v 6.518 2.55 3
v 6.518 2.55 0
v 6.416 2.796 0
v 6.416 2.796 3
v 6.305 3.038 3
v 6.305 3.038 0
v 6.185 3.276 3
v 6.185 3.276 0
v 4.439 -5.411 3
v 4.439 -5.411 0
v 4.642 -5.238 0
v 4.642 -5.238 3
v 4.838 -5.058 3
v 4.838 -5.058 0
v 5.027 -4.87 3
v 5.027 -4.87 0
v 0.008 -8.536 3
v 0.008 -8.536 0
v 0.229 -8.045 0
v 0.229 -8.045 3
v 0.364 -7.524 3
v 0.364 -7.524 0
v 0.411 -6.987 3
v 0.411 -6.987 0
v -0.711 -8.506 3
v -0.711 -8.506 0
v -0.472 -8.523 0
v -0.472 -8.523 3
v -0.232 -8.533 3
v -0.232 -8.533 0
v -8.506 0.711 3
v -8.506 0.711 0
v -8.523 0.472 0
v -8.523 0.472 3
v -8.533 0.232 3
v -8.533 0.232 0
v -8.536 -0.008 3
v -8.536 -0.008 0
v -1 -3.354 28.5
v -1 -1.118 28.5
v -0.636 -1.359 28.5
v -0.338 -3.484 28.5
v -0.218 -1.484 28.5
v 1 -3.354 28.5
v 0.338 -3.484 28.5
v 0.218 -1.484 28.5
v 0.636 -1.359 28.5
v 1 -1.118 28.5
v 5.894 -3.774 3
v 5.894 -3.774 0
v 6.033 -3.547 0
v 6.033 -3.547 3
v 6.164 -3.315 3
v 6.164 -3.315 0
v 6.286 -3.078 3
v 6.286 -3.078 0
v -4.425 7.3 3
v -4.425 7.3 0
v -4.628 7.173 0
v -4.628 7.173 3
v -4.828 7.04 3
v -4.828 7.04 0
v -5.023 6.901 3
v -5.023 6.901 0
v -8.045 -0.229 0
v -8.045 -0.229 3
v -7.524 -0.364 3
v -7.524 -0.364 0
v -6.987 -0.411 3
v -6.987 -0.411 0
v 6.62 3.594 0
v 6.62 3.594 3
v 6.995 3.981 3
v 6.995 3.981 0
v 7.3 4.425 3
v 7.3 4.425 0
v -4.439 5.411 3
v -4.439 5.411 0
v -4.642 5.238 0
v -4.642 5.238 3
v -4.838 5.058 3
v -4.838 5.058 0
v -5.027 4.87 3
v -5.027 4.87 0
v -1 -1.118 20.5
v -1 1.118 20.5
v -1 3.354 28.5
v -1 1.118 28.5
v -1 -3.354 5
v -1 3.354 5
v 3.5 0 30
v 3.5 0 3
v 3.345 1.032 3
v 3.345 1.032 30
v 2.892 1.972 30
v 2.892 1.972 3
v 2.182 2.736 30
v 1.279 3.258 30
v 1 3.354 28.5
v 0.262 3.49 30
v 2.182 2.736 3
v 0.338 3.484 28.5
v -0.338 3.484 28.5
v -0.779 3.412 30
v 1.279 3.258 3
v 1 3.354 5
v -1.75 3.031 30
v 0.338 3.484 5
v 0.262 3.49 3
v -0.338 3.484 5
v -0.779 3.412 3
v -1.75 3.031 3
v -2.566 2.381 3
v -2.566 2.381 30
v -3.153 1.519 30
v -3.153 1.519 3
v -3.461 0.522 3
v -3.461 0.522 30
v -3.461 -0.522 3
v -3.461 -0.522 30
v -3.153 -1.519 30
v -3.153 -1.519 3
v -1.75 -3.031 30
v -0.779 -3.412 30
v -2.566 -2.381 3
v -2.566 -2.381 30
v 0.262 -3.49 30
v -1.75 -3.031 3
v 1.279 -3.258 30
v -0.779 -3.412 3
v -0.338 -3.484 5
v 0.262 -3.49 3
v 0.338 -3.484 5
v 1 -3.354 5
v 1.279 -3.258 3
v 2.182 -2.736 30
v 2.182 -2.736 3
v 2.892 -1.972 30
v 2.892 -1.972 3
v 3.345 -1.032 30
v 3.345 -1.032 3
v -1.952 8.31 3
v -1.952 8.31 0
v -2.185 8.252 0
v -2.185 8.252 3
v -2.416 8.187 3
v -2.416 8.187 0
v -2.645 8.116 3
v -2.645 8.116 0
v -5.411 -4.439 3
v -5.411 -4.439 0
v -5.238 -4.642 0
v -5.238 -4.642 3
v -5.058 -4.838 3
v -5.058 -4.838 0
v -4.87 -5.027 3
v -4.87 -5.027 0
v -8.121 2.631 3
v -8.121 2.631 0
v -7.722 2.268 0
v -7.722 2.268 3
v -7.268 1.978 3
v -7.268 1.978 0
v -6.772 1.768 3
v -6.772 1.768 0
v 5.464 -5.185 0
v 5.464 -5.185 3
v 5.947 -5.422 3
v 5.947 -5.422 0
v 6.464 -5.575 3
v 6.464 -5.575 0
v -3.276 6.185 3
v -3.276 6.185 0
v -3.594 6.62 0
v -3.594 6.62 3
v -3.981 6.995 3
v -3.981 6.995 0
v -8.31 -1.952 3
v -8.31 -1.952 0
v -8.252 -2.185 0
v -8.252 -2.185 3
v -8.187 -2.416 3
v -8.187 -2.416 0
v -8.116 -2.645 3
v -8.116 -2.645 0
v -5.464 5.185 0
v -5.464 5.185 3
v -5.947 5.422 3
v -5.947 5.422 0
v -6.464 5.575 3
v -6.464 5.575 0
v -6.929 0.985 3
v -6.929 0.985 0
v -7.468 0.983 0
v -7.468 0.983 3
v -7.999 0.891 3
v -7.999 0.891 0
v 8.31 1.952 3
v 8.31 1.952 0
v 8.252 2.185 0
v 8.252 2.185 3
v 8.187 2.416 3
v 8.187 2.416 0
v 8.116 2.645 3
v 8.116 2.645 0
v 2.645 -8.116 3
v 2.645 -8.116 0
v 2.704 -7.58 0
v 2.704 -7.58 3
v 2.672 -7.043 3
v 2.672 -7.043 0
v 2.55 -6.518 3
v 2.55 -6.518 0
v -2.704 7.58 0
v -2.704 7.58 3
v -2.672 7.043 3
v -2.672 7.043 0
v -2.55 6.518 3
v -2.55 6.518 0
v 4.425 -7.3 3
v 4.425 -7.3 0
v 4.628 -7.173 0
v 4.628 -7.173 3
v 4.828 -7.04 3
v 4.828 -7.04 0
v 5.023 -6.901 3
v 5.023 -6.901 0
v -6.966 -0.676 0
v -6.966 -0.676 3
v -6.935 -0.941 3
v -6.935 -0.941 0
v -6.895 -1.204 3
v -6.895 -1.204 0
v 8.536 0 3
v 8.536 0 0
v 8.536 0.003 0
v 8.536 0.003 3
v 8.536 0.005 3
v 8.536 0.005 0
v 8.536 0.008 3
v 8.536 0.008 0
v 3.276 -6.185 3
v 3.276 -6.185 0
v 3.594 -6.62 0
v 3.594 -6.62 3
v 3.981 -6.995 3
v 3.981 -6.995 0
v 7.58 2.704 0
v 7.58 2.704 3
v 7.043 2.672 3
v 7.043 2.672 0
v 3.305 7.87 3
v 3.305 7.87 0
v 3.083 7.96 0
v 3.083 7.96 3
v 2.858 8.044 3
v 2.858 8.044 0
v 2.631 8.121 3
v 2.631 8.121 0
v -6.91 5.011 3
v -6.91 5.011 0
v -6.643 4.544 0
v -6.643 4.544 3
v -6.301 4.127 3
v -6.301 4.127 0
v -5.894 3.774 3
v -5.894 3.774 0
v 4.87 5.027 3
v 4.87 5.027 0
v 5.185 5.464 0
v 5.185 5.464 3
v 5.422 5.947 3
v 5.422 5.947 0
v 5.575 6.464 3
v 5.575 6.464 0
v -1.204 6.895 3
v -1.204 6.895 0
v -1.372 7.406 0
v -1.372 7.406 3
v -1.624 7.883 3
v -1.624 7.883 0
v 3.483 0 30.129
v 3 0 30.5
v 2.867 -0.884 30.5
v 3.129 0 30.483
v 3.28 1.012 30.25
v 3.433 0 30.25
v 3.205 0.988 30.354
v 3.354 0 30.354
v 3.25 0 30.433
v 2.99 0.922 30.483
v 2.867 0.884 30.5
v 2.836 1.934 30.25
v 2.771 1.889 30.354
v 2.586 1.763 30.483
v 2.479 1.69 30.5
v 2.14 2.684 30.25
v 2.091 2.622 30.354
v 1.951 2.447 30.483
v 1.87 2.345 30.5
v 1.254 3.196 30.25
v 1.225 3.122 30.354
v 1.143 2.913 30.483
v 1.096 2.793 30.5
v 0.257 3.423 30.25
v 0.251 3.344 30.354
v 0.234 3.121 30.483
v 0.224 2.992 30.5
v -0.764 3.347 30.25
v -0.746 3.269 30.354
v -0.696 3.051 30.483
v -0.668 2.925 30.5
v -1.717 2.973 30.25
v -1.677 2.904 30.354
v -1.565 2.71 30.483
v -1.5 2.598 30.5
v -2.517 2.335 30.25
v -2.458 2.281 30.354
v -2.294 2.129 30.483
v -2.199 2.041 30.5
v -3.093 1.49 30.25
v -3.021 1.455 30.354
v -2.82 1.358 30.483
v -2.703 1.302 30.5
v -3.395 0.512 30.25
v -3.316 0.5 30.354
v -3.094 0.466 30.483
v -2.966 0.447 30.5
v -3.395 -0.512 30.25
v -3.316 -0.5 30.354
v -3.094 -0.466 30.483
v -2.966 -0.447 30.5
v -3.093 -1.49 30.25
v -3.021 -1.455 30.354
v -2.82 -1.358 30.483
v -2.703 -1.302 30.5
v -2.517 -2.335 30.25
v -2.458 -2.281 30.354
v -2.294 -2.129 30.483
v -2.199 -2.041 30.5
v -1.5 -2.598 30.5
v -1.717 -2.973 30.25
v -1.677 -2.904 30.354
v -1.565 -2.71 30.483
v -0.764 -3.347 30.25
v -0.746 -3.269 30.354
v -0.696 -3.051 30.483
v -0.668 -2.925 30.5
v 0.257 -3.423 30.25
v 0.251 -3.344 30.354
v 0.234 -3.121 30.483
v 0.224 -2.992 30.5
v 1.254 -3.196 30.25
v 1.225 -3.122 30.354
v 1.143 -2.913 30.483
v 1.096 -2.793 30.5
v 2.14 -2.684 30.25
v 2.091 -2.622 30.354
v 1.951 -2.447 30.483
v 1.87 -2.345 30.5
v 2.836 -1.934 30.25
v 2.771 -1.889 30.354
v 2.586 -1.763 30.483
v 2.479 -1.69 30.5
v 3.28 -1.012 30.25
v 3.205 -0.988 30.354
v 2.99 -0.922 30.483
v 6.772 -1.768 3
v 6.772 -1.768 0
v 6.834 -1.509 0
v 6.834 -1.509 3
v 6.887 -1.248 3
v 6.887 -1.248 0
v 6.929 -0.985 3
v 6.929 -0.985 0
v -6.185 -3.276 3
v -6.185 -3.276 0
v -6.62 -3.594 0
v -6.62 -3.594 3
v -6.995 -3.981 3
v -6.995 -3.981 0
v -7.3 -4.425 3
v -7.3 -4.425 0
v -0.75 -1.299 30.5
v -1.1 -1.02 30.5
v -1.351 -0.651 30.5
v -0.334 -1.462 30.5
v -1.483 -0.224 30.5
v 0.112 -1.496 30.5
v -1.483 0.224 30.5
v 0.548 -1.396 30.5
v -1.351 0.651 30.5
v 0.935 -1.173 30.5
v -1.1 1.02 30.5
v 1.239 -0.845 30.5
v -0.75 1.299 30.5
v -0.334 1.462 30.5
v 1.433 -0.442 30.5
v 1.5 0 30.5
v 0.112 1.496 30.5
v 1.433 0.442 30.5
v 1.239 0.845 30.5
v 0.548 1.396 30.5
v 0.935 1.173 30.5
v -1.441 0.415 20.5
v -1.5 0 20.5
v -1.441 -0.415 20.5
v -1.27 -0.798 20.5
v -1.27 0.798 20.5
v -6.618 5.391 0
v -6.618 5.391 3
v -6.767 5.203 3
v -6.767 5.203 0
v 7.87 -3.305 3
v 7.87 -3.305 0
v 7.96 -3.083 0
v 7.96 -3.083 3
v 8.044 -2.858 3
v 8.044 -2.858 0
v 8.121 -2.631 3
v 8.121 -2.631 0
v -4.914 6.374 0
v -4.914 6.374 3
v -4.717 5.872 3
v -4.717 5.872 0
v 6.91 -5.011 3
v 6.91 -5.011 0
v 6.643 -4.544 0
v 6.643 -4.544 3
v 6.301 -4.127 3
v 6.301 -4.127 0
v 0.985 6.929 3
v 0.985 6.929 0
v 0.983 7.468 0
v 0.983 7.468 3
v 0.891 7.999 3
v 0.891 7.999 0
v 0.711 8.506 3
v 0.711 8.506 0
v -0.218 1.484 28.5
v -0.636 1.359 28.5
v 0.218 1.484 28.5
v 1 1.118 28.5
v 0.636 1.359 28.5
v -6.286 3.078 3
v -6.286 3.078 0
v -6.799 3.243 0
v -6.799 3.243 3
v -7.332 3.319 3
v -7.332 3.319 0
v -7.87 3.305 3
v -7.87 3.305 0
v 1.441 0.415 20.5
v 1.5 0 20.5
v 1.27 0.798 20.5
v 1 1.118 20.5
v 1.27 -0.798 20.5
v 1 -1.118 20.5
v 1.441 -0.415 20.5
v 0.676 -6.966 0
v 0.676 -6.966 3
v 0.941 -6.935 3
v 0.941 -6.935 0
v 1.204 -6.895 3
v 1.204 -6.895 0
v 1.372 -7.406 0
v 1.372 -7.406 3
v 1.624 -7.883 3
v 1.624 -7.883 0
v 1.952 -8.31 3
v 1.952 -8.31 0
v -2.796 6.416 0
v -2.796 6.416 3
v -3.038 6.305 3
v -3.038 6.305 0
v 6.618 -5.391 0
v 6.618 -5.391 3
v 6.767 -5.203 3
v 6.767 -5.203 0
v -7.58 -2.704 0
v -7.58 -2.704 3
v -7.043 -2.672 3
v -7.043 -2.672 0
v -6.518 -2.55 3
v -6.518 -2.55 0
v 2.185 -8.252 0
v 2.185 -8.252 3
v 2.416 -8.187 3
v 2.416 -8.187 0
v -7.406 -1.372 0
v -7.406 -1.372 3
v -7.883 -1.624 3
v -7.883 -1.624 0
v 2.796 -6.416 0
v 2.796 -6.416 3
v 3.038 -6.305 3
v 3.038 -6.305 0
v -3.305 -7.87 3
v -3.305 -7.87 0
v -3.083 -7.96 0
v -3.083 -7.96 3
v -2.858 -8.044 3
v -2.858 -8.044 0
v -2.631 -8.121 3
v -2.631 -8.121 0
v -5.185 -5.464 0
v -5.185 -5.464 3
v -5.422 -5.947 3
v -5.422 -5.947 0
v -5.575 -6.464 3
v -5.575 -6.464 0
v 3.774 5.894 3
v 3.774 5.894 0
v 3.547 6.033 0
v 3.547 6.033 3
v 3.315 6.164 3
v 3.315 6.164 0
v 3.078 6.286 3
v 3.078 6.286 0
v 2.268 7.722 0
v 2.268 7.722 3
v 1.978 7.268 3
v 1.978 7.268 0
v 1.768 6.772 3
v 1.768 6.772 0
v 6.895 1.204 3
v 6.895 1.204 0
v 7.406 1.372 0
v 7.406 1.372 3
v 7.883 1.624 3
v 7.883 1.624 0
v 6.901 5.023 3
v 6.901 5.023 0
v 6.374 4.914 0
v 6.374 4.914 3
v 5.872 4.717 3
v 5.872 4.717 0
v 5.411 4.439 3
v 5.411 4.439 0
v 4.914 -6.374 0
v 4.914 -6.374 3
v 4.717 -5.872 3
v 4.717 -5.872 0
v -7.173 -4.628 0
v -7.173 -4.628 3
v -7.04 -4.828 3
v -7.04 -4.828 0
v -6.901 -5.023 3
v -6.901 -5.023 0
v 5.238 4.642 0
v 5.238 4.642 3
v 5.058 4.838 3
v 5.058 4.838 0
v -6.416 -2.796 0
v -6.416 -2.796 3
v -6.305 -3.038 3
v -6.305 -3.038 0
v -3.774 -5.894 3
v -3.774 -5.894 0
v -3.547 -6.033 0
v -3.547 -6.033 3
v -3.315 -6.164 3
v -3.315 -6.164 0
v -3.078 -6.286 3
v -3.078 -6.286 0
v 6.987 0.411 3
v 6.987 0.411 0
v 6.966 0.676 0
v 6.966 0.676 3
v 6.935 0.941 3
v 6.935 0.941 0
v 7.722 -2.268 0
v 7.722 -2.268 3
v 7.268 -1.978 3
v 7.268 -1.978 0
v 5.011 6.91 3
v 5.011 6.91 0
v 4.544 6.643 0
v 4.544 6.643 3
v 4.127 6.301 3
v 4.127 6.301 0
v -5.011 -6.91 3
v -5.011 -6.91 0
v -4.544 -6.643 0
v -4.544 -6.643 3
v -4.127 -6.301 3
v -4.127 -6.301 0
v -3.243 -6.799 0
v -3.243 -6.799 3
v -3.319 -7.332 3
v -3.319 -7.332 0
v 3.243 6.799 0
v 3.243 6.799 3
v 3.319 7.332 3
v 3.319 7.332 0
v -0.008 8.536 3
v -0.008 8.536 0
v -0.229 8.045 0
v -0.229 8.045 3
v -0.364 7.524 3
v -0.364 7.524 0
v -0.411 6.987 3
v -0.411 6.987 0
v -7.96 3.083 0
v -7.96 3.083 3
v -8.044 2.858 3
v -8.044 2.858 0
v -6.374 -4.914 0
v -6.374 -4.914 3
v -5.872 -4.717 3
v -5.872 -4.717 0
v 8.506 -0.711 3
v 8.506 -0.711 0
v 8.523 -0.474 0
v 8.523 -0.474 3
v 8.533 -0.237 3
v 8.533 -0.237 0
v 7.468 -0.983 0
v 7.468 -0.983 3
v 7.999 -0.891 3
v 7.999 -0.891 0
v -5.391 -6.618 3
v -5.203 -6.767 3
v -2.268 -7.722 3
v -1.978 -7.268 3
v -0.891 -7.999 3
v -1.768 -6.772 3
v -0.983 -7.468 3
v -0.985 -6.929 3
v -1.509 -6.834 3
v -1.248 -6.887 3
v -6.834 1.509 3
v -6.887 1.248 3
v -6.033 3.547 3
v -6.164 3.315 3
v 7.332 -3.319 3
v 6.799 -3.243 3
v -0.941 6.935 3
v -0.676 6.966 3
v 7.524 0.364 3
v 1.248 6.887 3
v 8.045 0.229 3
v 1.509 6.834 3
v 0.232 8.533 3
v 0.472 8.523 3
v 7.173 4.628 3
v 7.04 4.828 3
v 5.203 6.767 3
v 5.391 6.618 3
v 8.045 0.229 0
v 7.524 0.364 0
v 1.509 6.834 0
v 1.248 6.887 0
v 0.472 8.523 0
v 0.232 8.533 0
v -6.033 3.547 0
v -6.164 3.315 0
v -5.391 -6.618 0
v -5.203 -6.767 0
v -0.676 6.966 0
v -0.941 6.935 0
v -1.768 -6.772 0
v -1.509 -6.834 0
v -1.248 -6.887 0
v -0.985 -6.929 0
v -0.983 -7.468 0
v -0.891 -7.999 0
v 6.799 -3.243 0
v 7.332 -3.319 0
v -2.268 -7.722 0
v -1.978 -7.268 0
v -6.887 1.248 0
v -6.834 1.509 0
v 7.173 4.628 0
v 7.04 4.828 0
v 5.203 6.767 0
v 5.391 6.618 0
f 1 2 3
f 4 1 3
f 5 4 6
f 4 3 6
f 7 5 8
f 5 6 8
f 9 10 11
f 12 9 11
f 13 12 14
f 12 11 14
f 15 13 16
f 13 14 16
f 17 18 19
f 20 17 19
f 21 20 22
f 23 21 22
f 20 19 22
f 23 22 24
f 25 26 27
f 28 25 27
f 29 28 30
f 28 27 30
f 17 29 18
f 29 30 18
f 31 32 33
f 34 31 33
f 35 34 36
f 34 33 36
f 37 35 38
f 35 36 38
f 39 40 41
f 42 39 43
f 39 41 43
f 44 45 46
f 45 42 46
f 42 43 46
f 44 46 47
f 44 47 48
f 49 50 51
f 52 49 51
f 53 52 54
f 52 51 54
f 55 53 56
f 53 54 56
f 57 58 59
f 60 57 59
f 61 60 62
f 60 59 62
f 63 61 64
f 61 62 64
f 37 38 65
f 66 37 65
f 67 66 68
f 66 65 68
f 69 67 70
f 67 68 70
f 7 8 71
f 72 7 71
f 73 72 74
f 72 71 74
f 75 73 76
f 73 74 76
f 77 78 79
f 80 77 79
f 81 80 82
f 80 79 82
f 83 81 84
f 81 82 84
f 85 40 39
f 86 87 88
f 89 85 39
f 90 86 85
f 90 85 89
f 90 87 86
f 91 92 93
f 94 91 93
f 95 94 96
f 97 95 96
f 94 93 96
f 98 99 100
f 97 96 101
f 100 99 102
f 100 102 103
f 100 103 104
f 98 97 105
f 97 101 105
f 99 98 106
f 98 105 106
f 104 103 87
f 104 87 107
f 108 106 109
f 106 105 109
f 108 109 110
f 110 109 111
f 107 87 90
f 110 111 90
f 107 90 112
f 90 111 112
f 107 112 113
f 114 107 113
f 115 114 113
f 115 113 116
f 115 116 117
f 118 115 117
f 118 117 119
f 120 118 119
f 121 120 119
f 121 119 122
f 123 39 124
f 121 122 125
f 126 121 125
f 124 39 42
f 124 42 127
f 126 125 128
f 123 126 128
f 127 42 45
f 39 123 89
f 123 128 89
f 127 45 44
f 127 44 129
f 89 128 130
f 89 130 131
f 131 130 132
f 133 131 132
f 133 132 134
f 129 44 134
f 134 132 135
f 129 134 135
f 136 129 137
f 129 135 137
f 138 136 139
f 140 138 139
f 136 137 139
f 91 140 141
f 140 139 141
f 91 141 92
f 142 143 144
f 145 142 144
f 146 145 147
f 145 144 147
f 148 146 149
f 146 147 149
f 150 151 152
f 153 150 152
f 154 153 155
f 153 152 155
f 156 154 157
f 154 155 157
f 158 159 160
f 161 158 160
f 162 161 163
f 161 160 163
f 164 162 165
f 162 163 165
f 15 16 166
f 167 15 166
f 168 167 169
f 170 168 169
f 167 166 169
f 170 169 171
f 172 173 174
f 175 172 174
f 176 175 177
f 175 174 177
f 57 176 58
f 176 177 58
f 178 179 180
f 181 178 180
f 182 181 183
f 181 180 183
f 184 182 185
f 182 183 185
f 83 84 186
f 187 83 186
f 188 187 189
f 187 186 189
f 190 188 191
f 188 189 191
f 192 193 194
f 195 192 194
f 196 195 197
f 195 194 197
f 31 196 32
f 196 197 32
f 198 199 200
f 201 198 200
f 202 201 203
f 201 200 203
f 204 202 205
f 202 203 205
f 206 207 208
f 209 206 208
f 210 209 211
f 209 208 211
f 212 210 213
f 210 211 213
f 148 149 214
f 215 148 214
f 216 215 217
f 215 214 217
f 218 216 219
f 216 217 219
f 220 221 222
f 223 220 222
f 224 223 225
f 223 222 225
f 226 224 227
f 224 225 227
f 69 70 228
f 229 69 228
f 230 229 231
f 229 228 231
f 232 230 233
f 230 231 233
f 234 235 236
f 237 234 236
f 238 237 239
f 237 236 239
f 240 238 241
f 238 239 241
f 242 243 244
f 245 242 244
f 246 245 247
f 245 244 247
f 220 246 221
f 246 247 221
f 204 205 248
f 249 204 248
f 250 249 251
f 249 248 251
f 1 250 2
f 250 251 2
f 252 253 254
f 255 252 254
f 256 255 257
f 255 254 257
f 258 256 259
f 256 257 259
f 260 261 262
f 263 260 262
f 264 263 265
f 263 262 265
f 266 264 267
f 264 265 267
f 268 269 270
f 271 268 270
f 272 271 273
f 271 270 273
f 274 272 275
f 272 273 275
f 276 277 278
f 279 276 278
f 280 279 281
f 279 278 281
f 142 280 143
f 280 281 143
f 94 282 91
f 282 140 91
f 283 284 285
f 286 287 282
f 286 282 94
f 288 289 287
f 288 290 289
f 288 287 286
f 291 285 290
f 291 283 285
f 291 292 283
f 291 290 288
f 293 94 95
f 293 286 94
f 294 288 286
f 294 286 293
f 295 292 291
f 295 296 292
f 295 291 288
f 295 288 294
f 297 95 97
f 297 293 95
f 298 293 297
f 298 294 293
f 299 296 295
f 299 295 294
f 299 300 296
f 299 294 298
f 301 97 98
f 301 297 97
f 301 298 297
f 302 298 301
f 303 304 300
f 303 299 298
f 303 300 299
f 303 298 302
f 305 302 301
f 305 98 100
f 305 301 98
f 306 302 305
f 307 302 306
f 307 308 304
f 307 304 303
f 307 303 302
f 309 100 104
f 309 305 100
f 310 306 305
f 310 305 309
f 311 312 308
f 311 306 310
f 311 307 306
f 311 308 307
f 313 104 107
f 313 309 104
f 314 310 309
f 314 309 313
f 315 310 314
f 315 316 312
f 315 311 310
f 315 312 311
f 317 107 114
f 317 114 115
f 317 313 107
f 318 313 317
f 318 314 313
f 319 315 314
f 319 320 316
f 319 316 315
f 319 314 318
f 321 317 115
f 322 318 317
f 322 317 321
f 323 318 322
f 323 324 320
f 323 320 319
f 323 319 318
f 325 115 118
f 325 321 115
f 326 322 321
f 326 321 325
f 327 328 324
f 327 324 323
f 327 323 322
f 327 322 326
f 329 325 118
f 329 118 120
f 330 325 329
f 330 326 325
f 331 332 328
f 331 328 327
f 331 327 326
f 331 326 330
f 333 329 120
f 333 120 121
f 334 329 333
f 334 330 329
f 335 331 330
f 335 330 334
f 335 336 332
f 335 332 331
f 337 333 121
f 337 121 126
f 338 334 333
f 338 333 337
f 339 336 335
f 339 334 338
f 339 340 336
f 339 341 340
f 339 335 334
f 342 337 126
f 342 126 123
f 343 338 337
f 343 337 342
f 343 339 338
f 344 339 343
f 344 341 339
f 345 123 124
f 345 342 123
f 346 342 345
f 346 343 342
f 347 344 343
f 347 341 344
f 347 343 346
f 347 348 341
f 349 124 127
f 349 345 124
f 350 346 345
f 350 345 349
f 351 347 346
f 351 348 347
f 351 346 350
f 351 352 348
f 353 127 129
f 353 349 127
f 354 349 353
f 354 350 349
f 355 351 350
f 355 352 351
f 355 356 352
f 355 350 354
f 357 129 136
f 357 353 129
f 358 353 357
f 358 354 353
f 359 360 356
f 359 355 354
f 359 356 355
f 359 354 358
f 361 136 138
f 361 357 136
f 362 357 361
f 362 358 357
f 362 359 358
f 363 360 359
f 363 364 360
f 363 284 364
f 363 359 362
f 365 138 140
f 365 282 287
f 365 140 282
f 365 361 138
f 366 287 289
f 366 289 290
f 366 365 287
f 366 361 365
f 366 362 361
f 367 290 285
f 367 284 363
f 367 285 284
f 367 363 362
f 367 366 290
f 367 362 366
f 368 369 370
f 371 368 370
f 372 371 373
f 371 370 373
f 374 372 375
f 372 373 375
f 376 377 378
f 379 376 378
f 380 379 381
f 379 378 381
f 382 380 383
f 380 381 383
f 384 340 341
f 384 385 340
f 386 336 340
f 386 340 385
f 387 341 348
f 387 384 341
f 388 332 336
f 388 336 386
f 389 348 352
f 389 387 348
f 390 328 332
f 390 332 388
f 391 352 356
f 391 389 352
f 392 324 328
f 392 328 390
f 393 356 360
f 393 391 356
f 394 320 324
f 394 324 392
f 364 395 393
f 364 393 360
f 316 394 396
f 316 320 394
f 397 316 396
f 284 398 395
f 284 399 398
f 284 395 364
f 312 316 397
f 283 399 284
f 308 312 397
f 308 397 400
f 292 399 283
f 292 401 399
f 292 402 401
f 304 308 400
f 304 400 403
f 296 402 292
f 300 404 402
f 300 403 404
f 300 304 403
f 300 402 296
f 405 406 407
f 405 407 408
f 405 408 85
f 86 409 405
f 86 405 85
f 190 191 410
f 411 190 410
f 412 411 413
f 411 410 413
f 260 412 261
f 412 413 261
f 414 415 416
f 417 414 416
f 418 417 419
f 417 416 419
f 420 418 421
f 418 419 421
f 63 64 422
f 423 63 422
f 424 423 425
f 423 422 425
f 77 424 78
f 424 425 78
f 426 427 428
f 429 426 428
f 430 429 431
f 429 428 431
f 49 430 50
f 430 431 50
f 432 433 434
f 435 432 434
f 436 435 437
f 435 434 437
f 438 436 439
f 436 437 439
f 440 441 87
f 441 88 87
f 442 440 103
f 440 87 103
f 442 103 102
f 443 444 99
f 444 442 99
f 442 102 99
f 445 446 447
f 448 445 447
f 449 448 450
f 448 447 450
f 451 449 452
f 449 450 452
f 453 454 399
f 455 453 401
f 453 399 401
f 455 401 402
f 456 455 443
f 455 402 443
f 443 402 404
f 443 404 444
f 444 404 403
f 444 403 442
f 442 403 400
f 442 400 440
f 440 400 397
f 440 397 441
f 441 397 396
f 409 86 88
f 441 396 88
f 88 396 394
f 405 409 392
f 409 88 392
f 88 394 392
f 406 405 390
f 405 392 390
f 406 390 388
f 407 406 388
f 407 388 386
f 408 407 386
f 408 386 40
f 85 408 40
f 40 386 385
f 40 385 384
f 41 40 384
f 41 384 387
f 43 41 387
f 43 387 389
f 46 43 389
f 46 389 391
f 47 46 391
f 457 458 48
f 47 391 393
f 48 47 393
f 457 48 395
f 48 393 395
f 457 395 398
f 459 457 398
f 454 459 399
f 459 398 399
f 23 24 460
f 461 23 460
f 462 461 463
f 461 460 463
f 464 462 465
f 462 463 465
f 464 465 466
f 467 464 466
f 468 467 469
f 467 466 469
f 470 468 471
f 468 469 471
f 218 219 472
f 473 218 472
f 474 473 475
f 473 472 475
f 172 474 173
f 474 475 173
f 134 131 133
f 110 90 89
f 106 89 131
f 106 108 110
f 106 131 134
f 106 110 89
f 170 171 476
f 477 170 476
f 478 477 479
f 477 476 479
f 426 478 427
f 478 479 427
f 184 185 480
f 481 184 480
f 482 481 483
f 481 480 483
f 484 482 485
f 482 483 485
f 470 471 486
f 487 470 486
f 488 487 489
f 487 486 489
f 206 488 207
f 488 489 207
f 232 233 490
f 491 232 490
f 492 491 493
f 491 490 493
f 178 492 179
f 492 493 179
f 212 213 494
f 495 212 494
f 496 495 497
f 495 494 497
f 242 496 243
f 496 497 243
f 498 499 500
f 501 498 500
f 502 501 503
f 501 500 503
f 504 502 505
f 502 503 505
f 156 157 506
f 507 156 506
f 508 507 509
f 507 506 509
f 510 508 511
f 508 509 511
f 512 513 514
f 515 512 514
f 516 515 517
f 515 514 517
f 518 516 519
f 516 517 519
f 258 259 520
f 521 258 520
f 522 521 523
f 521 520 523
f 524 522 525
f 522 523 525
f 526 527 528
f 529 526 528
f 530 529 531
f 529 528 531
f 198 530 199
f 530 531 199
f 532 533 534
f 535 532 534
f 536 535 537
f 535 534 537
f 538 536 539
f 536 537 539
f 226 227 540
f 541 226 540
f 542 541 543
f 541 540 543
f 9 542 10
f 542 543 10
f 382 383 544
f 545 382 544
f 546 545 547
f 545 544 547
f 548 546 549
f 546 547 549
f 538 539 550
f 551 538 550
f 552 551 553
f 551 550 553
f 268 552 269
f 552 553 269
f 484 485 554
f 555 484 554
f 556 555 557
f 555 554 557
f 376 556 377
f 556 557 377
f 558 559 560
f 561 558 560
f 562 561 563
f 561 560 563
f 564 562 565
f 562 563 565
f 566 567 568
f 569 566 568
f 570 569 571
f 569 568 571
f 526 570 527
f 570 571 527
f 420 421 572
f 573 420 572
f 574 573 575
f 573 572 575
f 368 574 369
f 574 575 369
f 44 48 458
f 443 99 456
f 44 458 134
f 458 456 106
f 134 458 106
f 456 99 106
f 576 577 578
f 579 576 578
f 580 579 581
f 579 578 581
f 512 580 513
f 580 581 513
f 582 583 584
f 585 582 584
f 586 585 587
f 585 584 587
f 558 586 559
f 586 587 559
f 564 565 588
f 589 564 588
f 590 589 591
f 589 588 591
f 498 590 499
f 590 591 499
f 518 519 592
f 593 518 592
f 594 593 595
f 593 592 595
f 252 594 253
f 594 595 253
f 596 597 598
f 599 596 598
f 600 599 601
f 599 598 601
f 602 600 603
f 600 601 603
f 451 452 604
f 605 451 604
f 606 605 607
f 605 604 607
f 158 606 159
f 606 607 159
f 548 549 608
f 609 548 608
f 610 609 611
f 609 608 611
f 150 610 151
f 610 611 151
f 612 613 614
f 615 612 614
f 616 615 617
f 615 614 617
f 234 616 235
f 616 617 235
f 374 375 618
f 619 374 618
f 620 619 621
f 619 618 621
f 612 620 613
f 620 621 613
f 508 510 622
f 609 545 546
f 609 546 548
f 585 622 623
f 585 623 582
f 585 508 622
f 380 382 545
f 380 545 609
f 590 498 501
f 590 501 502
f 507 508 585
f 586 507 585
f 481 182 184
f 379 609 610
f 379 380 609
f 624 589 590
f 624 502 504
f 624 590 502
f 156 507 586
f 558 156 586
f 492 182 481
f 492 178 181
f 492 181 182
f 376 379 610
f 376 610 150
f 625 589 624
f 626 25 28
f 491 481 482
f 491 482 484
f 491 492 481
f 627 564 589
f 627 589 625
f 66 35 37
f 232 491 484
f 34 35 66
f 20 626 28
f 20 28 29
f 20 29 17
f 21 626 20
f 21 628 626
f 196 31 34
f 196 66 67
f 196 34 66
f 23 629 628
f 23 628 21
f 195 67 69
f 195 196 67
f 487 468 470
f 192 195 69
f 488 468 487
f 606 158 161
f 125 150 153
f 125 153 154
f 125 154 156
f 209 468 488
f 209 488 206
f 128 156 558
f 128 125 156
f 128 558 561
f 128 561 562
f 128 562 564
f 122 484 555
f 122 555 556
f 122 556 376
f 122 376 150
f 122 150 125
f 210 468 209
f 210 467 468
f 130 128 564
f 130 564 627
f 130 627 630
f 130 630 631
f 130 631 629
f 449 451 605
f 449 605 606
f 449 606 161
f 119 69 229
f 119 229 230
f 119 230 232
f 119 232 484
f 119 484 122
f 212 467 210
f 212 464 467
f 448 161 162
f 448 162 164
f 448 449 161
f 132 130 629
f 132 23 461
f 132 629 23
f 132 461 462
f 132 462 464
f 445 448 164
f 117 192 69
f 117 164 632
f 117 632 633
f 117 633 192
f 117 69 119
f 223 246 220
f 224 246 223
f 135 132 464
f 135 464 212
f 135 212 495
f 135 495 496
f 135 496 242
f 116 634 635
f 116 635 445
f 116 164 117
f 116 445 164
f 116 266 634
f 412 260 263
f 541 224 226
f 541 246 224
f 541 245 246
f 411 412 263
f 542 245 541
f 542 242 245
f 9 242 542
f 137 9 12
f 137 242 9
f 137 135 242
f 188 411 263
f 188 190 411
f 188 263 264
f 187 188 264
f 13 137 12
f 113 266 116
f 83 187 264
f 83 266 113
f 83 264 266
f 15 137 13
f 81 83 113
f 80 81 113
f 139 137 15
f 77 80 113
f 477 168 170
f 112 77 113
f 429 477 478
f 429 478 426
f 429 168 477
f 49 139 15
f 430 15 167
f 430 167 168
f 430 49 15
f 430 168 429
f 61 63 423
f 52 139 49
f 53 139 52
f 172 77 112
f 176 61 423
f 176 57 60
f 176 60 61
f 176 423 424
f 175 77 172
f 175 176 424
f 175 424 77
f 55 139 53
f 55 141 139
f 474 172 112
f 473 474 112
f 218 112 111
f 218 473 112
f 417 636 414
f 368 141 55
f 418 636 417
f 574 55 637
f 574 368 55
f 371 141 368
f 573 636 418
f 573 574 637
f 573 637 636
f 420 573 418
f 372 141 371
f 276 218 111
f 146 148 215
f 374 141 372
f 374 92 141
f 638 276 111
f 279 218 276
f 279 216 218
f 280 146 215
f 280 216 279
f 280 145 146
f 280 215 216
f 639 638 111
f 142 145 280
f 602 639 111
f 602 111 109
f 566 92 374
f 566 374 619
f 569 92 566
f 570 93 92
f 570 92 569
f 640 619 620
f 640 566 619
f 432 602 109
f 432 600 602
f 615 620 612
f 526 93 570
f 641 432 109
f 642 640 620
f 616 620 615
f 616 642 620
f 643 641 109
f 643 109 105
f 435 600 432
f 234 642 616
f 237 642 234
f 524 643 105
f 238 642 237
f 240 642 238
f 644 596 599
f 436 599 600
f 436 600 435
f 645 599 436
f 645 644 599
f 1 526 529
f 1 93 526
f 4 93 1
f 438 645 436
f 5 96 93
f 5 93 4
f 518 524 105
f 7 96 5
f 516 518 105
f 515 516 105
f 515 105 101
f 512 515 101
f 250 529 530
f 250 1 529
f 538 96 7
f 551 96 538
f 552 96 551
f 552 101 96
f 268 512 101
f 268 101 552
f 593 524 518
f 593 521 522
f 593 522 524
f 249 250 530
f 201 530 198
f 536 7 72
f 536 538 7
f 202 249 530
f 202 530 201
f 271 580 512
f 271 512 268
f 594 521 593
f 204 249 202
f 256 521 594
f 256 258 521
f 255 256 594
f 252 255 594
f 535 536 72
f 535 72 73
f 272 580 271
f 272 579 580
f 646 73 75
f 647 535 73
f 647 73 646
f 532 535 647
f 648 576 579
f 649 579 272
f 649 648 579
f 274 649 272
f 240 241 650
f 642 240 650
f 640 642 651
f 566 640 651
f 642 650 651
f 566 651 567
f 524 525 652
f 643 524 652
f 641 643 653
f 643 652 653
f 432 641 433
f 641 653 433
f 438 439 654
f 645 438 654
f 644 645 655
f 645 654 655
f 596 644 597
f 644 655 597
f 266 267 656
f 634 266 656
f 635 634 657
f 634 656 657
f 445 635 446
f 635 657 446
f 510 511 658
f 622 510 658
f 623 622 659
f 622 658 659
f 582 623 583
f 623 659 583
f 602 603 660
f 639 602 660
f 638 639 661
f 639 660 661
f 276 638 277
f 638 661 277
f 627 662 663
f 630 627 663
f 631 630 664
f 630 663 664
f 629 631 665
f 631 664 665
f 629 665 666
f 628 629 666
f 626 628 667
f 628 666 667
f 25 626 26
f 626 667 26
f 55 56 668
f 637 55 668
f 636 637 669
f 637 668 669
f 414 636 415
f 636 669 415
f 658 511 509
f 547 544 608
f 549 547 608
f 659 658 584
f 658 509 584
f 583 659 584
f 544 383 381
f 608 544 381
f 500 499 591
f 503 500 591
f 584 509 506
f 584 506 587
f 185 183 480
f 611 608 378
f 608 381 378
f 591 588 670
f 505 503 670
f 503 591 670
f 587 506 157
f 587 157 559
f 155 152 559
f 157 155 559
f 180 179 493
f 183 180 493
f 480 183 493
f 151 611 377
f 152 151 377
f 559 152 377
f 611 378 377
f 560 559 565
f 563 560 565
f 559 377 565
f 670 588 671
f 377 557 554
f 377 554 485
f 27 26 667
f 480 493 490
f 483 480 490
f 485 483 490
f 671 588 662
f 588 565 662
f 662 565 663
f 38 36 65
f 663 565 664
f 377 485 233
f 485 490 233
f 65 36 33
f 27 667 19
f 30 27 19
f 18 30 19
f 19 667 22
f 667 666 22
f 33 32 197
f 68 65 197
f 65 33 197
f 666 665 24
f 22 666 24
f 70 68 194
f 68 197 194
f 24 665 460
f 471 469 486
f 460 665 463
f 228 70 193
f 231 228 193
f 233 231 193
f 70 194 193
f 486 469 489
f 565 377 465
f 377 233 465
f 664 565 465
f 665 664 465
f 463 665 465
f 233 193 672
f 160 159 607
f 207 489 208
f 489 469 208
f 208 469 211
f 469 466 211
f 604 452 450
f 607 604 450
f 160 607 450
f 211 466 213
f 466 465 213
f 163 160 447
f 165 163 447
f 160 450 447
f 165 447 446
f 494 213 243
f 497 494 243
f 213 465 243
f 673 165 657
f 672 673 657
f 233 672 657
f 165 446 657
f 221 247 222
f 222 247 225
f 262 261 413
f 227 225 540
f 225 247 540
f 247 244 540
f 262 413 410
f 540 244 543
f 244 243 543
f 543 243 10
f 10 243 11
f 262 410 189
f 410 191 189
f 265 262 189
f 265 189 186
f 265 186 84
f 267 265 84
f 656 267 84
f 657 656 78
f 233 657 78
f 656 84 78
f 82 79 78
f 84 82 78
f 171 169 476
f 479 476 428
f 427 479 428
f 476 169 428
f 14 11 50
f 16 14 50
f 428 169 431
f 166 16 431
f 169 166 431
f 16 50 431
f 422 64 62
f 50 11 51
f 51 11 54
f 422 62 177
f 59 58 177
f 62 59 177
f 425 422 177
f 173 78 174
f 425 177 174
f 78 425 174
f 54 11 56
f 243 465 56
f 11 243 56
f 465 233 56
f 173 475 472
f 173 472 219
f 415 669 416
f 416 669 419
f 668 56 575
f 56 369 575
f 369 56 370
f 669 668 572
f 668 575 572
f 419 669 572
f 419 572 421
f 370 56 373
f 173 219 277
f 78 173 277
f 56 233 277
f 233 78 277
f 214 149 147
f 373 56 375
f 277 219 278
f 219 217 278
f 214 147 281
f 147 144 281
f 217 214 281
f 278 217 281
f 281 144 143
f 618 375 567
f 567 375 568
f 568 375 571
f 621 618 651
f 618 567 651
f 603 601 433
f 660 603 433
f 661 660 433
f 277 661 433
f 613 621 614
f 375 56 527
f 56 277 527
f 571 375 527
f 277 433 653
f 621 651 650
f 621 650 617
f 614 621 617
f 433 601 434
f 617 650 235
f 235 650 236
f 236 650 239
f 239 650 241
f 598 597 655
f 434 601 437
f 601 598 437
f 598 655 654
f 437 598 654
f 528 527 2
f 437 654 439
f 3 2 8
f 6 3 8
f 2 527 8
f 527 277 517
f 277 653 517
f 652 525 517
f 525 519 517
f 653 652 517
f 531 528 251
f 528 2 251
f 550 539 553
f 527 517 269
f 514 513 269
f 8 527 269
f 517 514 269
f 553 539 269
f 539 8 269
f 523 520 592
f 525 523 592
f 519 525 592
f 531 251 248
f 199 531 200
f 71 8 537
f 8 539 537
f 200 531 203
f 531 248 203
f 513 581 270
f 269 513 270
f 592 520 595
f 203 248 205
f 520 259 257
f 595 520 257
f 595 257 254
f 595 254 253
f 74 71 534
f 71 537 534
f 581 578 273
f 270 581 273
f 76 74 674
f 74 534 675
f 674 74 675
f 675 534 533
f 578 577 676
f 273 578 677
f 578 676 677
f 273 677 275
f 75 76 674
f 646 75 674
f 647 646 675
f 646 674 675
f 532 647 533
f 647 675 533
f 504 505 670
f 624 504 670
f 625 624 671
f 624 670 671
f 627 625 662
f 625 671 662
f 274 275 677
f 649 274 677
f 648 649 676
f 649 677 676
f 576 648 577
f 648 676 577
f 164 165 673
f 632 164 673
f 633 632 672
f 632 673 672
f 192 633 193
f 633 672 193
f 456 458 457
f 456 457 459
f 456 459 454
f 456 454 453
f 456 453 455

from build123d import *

# Parameters (mm, degrees)
EXTRUDE_4_DEPTH     = 3
SKETCH_5_R          = 3.5
EXTRUDE_6_DEPTH     = 27.5
SKETCH_8_R          = 1.5
CUT_EXTRUDE_1_DEPTH = 10
SKETCH_10_W         = 2
SKETCH_10_H         = 23.5
CUT_EXTRUDE_2_DEPTH = 5
FILLET_1_R          = 0.5


with BuildPart() as part:
    # 草图4 → 凸台-拉伸4 (new body)
    with BuildSketch(Plane.XY):
        with BuildLine():
            ThreePointArc((8.536063079, 0.007574004), (7.787120491, 0.307636704), (6.986931627, 0.410837493))
            ThreePointArc((6.986931627, 0.410837493), (6.952112765, 0.808782481), (6.894647301, 1.204092849))
            ThreePointArc((6.894647301, 1.204092849), (7.649774364, 1.488233206), (8.309831075, 1.95221355))
            ThreePointArc((8.309831075, 1.95221355), (8.220185959, 2.300646222), (8.115937918, 2.644991862))
            ThreePointArc((8.115937918, 2.644991862), (7.310926717, 2.698932461), (6.518011085, 2.549810286))
            ThreePointArc((6.518011085, 2.549810286), (6.361924616, 2.91751884), (6.18511409, 3.275723537))
            ThreePointArc((6.18511409, 3.275723537), (6.815478405, 3.77930417), (7.29985183, 4.424544441))
            ThreePointArc((7.29985183, 4.424544441), (7.106922641, 4.72822174), (6.901368208, 5.023499488))
            ThreePointArc((6.901368208, 5.023499488), (6.119088497, 4.826037904), (5.411062205, 4.439189883))
            ThreePointArc((5.411062205, 4.439189883), (5.148986959, 4.740668128), (4.870138818, 5.026703581))
            ThreePointArc((4.870138818, 5.026703581), (5.314035933, 5.70043051), (5.575312226, 6.463770094))
            ThreePointArc((5.575312226, 6.463770094), (5.297984218, 6.69296597), (5.011244492, 6.910271984))
            ThreePointArc((5.011244492, 6.910271984), (4.328271261, 6.480737132), (3.774440855, 5.894030644))
            ThreePointArc((3.774440855, 5.894030644), (3.432030584, 6.099767788), (3.078440426, 6.285634856))
            ThreePointArc((3.078440426, 6.285634856), (3.292418599, 7.063558994), (3.305022217, 7.870276894))
            ThreePointArc((3.305022217, 7.870276894), (2.970442186, 8.002556058), (2.63058525, 8.12061891))
            ThreePointArc((2.63058525, 8.12061891), (2.113772678, 7.501056656), (1.768350936, 6.77192262))
            ThreePointArc((1.768350936, 6.77192262), (1.379123142, 6.861779679), (0.985402836, 6.929284397))
            ThreePointArc((0.985402836, 6.929284397), (0.948516393, 7.735257109), (0.711213605, 8.506386157))
            ThreePointArc((0.711213605, 8.506386157), (0.352132577, 8.528800203), (-0.007574004, 8.536063079))
            ThreePointArc((-0.007574004, 8.536063079), (-0.307636703, 7.787120491), (-0.410837493, 6.986931627))
            ThreePointArc((-0.410837493, 6.986931627), (-0.808782481, 6.952112765), (-1.204092849, 6.894647301))
            ThreePointArc((-1.204092849, 6.894647301), (-1.488233206, 7.649774364), (-1.95221355, 8.309831075))
            ThreePointArc((-1.95221355, 8.309831075), (-2.300646222, 8.220185959), (-2.644991862, 8.115937918))
            ThreePointArc((-2.644991862, 8.115937918), (-2.698932461, 7.310926717), (-2.549810286, 6.518011085))
            ThreePointArc((-2.549810286, 6.518011085), (-2.91751884, 6.361924616), (-3.275723537, 6.18511409))
            ThreePointArc((-3.275723537, 6.18511409), (-3.77930417, 6.815478405), (-4.424544441, 7.29985183))
            ThreePointArc((-4.424544441, 7.29985183), (-4.72822174, 7.106922641), (-5.023499488, 6.901368208))
            ThreePointArc((-5.023499488, 6.901368208), (-4.826037904, 6.119088497), (-4.439189882, 5.411062205))
            ThreePointArc((-4.439189882, 5.411062205), (-4.740668128, 5.148986959), (-5.026703581, 4.870138818))
            ThreePointArc((-5.026703581, 4.870138818), (-5.70043051, 5.314035933), (-6.463770094, 5.575312226))
            ThreePointArc((-6.463770094, 5.575312226), (-6.69296597, 5.297984218), (-6.910271984, 5.011244492))
            ThreePointArc((-6.910271984, 5.011244492), (-6.480737132, 4.328271262), (-5.894030644, 3.774440855))
            ThreePointArc((-5.894030644, 3.774440855), (-6.099767788, 3.432030584), (-6.285634856, 3.078440426))
            ThreePointArc((-6.285634856, 3.078440426), (-7.063558994, 3.292418599), (-7.870276894, 3.305022217))
            ThreePointArc((-7.870276894, 3.305022217), (-8.002556058, 2.970442186), (-8.12061891, 2.63058525))
            ThreePointArc((-8.12061891, 2.63058525), (-7.501056656, 2.113772678), (-6.77192262, 1.768350936))
            ThreePointArc((-6.77192262, 1.768350936), (-6.861779679, 1.379123142), (-6.929284397, 0.985402836))
            ThreePointArc((-6.929284397, 0.985402836), (-7.735257109, 0.948516393), (-8.506386157, 0.711213605))
            ThreePointArc((-8.506386157, 0.711213605), (-8.528800203, 0.352132577), (-8.536063079, -0.007574004))
            ThreePointArc((-8.536063079, -0.007574004), (-7.787120492, -0.307636703), (-6.986931627, -0.410837493))
            ThreePointArc((-6.986931627, -0.410837493), (-6.952112765, -0.808782481), (-6.894647301, -1.204092849))
            ThreePointArc((-6.894647301, -1.204092849), (-7.649774364, -1.488233206), (-8.309831076, -1.95221355))
            ThreePointArc((-8.309831076, -1.95221355), (-8.220185959, -2.300646222), (-8.115937918, -2.644991862))
            ThreePointArc((-8.115937918, -2.644991862), (-7.310926717, -2.698932461), (-6.518011085, -2.549810286))
            ThreePointArc((-6.518011085, -2.549810286), (-6.361924616, -2.91751884), (-6.18511409, -3.275723537))
            ThreePointArc((-6.18511409, -3.275723537), (-6.815478405, -3.77930417), (-7.29985183, -4.424544441))
            ThreePointArc((-7.29985183, -4.424544441), (-7.106922641, -4.72822174), (-6.901368208, -5.023499488))
            ThreePointArc((-6.901368208, -5.023499488), (-6.119088498, -4.826037904), (-5.411062205, -4.439189883))
            ThreePointArc((-5.411062205, -4.439189883), (-5.148986959, -4.740668128), (-4.870138818, -5.026703582))
            ThreePointArc((-4.870138818, -5.026703582), (-5.314035933, -5.70043051), (-5.575312227, -6.463770094))
            ThreePointArc((-5.575312227, -6.463770094), (-5.297984218, -6.69296597), (-5.011244492, -6.910271984))
            ThreePointArc((-5.011244492, -6.910271984), (-4.328271262, -6.480737132), (-3.774440855, -5.894030644))
            ThreePointArc((-3.774440855, -5.894030644), (-3.432030584, -6.099767789), (-3.078440426, -6.285634856))
            ThreePointArc((-3.078440426, -6.285634856), (-3.292418599, -7.063558994), (-3.305022217, -7.870276894))
            ThreePointArc((-3.305022217, -7.870276894), (-2.970442186, -8.002556058), (-2.63058525, -8.12061891))
            ThreePointArc((-2.63058525, -8.12061891), (-2.113772678, -7.501056656), (-1.768350936, -6.77192262))
            ThreePointArc((-1.768350936, -6.77192262), (-1.379123142, -6.861779679), (-0.985402836, -6.929284397))
            ThreePointArc((-0.985402836, -6.929284397), (-0.948516393, -7.735257109), (-0.711213605, -8.506386157))
            ThreePointArc((-0.711213605, -8.506386157), (-0.352132577, -8.528800203), (0.007574004, -8.536063079))
            ThreePointArc((0.007574004, -8.536063079), (0.307636704, -7.787120491), (0.410837493, -6.986931627))
            ThreePointArc((0.410837493, -6.986931627), (0.808782481, -6.952112765), (1.204092849, -6.894647301))
            ThreePointArc((1.204092849, -6.894647301), (1.488233206, -7.649774364), (1.95221355, -8.309831075))
            ThreePointArc((1.95221355, -8.309831075), (2.300646222, -8.220185959), (2.644991862, -8.115937918))
            ThreePointArc((2.644991862, -8.115937918), (2.698932461, -7.310926717), (2.549810286, -6.518011085))
            ThreePointArc((2.549810286, -6.518011085), (2.91751884, -6.361924616), (3.275723537, -6.18511409))
            ThreePointArc((3.275723537, -6.18511409), (3.77930417, -6.815478405), (4.424544441, -7.29985183))
            ThreePointArc((4.424544441, -7.29985183), (4.72822174, -7.106922641), (5.023499488, -6.901368208))
            ThreePointArc((5.023499488, -6.901368208), (4.826037904, -6.119088497), (4.439189883, -5.411062205))
            ThreePointArc((4.439189883, -5.411062205), (4.740668128, -5.148986959), (5.026703582, -4.870138818))
            ThreePointArc((5.026703582, -4.870138818), (5.70043051, -5.314035933), (6.463770094, -5.575312226))
            ThreePointArc((6.463770094, -5.575312226), (6.69296597, -5.297984218), (6.910271984, -5.011244492))
            ThreePointArc((6.910271984, -5.011244492), (6.480737132, -4.328271261), (5.894030644, -3.774440855))
            ThreePointArc((5.894030644, -3.774440855), (6.099767788, -3.432030584), (6.285634856, -3.078440425))
            ThreePointArc((6.285634856, -3.078440425), (7.063558994, -3.292418599), (7.870276894, -3.305022217))
            ThreePointArc((7.870276894, -3.305022217), (8.002556058, -2.970442186), (8.12061891, -2.63058525))
            ThreePointArc((8.12061891, -2.63058525), (7.501056656, -2.113772678), (6.77192262, -1.768350936))
            ThreePointArc((6.77192262, -1.768350936), (6.861779679, -1.379123142), (6.929284397, -0.985402836))
            ThreePointArc((6.929284397, -0.985402836), (7.735257109, -0.948516393), (8.506386157, -0.711213605))
            ThreePointArc((8.506386157, -0.711213605), (8.528643141, -0.355916321), (8.536066439, 0))
            ThreePointArc((8.536066439, 0), (8.536065599, 0.003787002), (8.536063079, 0.007574004))
        make_face()
    extrude(amount=EXTRUDE_4_DEPTH)

    # 草图5 → 凸台-拉伸6 (add)
    with BuildSketch(Plane.XY.offset(3)):
        Circle(SKETCH_5_R)
    extrude(amount=EXTRUDE_6_DEPTH)

    # 草图8 → 切除-拉伸1 (cut)
    with BuildSketch(Plane.XY.offset(30.5)):
        Circle(SKETCH_8_R)
    extrude(amount=-CUT_EXTRUDE_1_DEPTH, mode=Mode.SUBTRACT)

    # 草图10 → 切除-拉伸2 (cut, symmetric)
    with BuildSketch(Plane(origin=(0, 0, 0), x_dir=(1, 0, 0), z_dir=(0, 1, 0))):
        with Locations((0, -16.75)):
            Rectangle(SKETCH_10_W, SKETCH_10_H)
    extrude(amount=CUT_EXTRUDE_2_DEPTH, both=True, mode=Mode.SUBTRACT)

    # 圆角1
    fillet_1_edges = [part.edges().sort_by_distance(p)[0] for p in [
        (-3.5, 0, 30.5),
    ]]
    fillet(fillet_1_edges, radius=FILLET_1_R)


solid = part.part
